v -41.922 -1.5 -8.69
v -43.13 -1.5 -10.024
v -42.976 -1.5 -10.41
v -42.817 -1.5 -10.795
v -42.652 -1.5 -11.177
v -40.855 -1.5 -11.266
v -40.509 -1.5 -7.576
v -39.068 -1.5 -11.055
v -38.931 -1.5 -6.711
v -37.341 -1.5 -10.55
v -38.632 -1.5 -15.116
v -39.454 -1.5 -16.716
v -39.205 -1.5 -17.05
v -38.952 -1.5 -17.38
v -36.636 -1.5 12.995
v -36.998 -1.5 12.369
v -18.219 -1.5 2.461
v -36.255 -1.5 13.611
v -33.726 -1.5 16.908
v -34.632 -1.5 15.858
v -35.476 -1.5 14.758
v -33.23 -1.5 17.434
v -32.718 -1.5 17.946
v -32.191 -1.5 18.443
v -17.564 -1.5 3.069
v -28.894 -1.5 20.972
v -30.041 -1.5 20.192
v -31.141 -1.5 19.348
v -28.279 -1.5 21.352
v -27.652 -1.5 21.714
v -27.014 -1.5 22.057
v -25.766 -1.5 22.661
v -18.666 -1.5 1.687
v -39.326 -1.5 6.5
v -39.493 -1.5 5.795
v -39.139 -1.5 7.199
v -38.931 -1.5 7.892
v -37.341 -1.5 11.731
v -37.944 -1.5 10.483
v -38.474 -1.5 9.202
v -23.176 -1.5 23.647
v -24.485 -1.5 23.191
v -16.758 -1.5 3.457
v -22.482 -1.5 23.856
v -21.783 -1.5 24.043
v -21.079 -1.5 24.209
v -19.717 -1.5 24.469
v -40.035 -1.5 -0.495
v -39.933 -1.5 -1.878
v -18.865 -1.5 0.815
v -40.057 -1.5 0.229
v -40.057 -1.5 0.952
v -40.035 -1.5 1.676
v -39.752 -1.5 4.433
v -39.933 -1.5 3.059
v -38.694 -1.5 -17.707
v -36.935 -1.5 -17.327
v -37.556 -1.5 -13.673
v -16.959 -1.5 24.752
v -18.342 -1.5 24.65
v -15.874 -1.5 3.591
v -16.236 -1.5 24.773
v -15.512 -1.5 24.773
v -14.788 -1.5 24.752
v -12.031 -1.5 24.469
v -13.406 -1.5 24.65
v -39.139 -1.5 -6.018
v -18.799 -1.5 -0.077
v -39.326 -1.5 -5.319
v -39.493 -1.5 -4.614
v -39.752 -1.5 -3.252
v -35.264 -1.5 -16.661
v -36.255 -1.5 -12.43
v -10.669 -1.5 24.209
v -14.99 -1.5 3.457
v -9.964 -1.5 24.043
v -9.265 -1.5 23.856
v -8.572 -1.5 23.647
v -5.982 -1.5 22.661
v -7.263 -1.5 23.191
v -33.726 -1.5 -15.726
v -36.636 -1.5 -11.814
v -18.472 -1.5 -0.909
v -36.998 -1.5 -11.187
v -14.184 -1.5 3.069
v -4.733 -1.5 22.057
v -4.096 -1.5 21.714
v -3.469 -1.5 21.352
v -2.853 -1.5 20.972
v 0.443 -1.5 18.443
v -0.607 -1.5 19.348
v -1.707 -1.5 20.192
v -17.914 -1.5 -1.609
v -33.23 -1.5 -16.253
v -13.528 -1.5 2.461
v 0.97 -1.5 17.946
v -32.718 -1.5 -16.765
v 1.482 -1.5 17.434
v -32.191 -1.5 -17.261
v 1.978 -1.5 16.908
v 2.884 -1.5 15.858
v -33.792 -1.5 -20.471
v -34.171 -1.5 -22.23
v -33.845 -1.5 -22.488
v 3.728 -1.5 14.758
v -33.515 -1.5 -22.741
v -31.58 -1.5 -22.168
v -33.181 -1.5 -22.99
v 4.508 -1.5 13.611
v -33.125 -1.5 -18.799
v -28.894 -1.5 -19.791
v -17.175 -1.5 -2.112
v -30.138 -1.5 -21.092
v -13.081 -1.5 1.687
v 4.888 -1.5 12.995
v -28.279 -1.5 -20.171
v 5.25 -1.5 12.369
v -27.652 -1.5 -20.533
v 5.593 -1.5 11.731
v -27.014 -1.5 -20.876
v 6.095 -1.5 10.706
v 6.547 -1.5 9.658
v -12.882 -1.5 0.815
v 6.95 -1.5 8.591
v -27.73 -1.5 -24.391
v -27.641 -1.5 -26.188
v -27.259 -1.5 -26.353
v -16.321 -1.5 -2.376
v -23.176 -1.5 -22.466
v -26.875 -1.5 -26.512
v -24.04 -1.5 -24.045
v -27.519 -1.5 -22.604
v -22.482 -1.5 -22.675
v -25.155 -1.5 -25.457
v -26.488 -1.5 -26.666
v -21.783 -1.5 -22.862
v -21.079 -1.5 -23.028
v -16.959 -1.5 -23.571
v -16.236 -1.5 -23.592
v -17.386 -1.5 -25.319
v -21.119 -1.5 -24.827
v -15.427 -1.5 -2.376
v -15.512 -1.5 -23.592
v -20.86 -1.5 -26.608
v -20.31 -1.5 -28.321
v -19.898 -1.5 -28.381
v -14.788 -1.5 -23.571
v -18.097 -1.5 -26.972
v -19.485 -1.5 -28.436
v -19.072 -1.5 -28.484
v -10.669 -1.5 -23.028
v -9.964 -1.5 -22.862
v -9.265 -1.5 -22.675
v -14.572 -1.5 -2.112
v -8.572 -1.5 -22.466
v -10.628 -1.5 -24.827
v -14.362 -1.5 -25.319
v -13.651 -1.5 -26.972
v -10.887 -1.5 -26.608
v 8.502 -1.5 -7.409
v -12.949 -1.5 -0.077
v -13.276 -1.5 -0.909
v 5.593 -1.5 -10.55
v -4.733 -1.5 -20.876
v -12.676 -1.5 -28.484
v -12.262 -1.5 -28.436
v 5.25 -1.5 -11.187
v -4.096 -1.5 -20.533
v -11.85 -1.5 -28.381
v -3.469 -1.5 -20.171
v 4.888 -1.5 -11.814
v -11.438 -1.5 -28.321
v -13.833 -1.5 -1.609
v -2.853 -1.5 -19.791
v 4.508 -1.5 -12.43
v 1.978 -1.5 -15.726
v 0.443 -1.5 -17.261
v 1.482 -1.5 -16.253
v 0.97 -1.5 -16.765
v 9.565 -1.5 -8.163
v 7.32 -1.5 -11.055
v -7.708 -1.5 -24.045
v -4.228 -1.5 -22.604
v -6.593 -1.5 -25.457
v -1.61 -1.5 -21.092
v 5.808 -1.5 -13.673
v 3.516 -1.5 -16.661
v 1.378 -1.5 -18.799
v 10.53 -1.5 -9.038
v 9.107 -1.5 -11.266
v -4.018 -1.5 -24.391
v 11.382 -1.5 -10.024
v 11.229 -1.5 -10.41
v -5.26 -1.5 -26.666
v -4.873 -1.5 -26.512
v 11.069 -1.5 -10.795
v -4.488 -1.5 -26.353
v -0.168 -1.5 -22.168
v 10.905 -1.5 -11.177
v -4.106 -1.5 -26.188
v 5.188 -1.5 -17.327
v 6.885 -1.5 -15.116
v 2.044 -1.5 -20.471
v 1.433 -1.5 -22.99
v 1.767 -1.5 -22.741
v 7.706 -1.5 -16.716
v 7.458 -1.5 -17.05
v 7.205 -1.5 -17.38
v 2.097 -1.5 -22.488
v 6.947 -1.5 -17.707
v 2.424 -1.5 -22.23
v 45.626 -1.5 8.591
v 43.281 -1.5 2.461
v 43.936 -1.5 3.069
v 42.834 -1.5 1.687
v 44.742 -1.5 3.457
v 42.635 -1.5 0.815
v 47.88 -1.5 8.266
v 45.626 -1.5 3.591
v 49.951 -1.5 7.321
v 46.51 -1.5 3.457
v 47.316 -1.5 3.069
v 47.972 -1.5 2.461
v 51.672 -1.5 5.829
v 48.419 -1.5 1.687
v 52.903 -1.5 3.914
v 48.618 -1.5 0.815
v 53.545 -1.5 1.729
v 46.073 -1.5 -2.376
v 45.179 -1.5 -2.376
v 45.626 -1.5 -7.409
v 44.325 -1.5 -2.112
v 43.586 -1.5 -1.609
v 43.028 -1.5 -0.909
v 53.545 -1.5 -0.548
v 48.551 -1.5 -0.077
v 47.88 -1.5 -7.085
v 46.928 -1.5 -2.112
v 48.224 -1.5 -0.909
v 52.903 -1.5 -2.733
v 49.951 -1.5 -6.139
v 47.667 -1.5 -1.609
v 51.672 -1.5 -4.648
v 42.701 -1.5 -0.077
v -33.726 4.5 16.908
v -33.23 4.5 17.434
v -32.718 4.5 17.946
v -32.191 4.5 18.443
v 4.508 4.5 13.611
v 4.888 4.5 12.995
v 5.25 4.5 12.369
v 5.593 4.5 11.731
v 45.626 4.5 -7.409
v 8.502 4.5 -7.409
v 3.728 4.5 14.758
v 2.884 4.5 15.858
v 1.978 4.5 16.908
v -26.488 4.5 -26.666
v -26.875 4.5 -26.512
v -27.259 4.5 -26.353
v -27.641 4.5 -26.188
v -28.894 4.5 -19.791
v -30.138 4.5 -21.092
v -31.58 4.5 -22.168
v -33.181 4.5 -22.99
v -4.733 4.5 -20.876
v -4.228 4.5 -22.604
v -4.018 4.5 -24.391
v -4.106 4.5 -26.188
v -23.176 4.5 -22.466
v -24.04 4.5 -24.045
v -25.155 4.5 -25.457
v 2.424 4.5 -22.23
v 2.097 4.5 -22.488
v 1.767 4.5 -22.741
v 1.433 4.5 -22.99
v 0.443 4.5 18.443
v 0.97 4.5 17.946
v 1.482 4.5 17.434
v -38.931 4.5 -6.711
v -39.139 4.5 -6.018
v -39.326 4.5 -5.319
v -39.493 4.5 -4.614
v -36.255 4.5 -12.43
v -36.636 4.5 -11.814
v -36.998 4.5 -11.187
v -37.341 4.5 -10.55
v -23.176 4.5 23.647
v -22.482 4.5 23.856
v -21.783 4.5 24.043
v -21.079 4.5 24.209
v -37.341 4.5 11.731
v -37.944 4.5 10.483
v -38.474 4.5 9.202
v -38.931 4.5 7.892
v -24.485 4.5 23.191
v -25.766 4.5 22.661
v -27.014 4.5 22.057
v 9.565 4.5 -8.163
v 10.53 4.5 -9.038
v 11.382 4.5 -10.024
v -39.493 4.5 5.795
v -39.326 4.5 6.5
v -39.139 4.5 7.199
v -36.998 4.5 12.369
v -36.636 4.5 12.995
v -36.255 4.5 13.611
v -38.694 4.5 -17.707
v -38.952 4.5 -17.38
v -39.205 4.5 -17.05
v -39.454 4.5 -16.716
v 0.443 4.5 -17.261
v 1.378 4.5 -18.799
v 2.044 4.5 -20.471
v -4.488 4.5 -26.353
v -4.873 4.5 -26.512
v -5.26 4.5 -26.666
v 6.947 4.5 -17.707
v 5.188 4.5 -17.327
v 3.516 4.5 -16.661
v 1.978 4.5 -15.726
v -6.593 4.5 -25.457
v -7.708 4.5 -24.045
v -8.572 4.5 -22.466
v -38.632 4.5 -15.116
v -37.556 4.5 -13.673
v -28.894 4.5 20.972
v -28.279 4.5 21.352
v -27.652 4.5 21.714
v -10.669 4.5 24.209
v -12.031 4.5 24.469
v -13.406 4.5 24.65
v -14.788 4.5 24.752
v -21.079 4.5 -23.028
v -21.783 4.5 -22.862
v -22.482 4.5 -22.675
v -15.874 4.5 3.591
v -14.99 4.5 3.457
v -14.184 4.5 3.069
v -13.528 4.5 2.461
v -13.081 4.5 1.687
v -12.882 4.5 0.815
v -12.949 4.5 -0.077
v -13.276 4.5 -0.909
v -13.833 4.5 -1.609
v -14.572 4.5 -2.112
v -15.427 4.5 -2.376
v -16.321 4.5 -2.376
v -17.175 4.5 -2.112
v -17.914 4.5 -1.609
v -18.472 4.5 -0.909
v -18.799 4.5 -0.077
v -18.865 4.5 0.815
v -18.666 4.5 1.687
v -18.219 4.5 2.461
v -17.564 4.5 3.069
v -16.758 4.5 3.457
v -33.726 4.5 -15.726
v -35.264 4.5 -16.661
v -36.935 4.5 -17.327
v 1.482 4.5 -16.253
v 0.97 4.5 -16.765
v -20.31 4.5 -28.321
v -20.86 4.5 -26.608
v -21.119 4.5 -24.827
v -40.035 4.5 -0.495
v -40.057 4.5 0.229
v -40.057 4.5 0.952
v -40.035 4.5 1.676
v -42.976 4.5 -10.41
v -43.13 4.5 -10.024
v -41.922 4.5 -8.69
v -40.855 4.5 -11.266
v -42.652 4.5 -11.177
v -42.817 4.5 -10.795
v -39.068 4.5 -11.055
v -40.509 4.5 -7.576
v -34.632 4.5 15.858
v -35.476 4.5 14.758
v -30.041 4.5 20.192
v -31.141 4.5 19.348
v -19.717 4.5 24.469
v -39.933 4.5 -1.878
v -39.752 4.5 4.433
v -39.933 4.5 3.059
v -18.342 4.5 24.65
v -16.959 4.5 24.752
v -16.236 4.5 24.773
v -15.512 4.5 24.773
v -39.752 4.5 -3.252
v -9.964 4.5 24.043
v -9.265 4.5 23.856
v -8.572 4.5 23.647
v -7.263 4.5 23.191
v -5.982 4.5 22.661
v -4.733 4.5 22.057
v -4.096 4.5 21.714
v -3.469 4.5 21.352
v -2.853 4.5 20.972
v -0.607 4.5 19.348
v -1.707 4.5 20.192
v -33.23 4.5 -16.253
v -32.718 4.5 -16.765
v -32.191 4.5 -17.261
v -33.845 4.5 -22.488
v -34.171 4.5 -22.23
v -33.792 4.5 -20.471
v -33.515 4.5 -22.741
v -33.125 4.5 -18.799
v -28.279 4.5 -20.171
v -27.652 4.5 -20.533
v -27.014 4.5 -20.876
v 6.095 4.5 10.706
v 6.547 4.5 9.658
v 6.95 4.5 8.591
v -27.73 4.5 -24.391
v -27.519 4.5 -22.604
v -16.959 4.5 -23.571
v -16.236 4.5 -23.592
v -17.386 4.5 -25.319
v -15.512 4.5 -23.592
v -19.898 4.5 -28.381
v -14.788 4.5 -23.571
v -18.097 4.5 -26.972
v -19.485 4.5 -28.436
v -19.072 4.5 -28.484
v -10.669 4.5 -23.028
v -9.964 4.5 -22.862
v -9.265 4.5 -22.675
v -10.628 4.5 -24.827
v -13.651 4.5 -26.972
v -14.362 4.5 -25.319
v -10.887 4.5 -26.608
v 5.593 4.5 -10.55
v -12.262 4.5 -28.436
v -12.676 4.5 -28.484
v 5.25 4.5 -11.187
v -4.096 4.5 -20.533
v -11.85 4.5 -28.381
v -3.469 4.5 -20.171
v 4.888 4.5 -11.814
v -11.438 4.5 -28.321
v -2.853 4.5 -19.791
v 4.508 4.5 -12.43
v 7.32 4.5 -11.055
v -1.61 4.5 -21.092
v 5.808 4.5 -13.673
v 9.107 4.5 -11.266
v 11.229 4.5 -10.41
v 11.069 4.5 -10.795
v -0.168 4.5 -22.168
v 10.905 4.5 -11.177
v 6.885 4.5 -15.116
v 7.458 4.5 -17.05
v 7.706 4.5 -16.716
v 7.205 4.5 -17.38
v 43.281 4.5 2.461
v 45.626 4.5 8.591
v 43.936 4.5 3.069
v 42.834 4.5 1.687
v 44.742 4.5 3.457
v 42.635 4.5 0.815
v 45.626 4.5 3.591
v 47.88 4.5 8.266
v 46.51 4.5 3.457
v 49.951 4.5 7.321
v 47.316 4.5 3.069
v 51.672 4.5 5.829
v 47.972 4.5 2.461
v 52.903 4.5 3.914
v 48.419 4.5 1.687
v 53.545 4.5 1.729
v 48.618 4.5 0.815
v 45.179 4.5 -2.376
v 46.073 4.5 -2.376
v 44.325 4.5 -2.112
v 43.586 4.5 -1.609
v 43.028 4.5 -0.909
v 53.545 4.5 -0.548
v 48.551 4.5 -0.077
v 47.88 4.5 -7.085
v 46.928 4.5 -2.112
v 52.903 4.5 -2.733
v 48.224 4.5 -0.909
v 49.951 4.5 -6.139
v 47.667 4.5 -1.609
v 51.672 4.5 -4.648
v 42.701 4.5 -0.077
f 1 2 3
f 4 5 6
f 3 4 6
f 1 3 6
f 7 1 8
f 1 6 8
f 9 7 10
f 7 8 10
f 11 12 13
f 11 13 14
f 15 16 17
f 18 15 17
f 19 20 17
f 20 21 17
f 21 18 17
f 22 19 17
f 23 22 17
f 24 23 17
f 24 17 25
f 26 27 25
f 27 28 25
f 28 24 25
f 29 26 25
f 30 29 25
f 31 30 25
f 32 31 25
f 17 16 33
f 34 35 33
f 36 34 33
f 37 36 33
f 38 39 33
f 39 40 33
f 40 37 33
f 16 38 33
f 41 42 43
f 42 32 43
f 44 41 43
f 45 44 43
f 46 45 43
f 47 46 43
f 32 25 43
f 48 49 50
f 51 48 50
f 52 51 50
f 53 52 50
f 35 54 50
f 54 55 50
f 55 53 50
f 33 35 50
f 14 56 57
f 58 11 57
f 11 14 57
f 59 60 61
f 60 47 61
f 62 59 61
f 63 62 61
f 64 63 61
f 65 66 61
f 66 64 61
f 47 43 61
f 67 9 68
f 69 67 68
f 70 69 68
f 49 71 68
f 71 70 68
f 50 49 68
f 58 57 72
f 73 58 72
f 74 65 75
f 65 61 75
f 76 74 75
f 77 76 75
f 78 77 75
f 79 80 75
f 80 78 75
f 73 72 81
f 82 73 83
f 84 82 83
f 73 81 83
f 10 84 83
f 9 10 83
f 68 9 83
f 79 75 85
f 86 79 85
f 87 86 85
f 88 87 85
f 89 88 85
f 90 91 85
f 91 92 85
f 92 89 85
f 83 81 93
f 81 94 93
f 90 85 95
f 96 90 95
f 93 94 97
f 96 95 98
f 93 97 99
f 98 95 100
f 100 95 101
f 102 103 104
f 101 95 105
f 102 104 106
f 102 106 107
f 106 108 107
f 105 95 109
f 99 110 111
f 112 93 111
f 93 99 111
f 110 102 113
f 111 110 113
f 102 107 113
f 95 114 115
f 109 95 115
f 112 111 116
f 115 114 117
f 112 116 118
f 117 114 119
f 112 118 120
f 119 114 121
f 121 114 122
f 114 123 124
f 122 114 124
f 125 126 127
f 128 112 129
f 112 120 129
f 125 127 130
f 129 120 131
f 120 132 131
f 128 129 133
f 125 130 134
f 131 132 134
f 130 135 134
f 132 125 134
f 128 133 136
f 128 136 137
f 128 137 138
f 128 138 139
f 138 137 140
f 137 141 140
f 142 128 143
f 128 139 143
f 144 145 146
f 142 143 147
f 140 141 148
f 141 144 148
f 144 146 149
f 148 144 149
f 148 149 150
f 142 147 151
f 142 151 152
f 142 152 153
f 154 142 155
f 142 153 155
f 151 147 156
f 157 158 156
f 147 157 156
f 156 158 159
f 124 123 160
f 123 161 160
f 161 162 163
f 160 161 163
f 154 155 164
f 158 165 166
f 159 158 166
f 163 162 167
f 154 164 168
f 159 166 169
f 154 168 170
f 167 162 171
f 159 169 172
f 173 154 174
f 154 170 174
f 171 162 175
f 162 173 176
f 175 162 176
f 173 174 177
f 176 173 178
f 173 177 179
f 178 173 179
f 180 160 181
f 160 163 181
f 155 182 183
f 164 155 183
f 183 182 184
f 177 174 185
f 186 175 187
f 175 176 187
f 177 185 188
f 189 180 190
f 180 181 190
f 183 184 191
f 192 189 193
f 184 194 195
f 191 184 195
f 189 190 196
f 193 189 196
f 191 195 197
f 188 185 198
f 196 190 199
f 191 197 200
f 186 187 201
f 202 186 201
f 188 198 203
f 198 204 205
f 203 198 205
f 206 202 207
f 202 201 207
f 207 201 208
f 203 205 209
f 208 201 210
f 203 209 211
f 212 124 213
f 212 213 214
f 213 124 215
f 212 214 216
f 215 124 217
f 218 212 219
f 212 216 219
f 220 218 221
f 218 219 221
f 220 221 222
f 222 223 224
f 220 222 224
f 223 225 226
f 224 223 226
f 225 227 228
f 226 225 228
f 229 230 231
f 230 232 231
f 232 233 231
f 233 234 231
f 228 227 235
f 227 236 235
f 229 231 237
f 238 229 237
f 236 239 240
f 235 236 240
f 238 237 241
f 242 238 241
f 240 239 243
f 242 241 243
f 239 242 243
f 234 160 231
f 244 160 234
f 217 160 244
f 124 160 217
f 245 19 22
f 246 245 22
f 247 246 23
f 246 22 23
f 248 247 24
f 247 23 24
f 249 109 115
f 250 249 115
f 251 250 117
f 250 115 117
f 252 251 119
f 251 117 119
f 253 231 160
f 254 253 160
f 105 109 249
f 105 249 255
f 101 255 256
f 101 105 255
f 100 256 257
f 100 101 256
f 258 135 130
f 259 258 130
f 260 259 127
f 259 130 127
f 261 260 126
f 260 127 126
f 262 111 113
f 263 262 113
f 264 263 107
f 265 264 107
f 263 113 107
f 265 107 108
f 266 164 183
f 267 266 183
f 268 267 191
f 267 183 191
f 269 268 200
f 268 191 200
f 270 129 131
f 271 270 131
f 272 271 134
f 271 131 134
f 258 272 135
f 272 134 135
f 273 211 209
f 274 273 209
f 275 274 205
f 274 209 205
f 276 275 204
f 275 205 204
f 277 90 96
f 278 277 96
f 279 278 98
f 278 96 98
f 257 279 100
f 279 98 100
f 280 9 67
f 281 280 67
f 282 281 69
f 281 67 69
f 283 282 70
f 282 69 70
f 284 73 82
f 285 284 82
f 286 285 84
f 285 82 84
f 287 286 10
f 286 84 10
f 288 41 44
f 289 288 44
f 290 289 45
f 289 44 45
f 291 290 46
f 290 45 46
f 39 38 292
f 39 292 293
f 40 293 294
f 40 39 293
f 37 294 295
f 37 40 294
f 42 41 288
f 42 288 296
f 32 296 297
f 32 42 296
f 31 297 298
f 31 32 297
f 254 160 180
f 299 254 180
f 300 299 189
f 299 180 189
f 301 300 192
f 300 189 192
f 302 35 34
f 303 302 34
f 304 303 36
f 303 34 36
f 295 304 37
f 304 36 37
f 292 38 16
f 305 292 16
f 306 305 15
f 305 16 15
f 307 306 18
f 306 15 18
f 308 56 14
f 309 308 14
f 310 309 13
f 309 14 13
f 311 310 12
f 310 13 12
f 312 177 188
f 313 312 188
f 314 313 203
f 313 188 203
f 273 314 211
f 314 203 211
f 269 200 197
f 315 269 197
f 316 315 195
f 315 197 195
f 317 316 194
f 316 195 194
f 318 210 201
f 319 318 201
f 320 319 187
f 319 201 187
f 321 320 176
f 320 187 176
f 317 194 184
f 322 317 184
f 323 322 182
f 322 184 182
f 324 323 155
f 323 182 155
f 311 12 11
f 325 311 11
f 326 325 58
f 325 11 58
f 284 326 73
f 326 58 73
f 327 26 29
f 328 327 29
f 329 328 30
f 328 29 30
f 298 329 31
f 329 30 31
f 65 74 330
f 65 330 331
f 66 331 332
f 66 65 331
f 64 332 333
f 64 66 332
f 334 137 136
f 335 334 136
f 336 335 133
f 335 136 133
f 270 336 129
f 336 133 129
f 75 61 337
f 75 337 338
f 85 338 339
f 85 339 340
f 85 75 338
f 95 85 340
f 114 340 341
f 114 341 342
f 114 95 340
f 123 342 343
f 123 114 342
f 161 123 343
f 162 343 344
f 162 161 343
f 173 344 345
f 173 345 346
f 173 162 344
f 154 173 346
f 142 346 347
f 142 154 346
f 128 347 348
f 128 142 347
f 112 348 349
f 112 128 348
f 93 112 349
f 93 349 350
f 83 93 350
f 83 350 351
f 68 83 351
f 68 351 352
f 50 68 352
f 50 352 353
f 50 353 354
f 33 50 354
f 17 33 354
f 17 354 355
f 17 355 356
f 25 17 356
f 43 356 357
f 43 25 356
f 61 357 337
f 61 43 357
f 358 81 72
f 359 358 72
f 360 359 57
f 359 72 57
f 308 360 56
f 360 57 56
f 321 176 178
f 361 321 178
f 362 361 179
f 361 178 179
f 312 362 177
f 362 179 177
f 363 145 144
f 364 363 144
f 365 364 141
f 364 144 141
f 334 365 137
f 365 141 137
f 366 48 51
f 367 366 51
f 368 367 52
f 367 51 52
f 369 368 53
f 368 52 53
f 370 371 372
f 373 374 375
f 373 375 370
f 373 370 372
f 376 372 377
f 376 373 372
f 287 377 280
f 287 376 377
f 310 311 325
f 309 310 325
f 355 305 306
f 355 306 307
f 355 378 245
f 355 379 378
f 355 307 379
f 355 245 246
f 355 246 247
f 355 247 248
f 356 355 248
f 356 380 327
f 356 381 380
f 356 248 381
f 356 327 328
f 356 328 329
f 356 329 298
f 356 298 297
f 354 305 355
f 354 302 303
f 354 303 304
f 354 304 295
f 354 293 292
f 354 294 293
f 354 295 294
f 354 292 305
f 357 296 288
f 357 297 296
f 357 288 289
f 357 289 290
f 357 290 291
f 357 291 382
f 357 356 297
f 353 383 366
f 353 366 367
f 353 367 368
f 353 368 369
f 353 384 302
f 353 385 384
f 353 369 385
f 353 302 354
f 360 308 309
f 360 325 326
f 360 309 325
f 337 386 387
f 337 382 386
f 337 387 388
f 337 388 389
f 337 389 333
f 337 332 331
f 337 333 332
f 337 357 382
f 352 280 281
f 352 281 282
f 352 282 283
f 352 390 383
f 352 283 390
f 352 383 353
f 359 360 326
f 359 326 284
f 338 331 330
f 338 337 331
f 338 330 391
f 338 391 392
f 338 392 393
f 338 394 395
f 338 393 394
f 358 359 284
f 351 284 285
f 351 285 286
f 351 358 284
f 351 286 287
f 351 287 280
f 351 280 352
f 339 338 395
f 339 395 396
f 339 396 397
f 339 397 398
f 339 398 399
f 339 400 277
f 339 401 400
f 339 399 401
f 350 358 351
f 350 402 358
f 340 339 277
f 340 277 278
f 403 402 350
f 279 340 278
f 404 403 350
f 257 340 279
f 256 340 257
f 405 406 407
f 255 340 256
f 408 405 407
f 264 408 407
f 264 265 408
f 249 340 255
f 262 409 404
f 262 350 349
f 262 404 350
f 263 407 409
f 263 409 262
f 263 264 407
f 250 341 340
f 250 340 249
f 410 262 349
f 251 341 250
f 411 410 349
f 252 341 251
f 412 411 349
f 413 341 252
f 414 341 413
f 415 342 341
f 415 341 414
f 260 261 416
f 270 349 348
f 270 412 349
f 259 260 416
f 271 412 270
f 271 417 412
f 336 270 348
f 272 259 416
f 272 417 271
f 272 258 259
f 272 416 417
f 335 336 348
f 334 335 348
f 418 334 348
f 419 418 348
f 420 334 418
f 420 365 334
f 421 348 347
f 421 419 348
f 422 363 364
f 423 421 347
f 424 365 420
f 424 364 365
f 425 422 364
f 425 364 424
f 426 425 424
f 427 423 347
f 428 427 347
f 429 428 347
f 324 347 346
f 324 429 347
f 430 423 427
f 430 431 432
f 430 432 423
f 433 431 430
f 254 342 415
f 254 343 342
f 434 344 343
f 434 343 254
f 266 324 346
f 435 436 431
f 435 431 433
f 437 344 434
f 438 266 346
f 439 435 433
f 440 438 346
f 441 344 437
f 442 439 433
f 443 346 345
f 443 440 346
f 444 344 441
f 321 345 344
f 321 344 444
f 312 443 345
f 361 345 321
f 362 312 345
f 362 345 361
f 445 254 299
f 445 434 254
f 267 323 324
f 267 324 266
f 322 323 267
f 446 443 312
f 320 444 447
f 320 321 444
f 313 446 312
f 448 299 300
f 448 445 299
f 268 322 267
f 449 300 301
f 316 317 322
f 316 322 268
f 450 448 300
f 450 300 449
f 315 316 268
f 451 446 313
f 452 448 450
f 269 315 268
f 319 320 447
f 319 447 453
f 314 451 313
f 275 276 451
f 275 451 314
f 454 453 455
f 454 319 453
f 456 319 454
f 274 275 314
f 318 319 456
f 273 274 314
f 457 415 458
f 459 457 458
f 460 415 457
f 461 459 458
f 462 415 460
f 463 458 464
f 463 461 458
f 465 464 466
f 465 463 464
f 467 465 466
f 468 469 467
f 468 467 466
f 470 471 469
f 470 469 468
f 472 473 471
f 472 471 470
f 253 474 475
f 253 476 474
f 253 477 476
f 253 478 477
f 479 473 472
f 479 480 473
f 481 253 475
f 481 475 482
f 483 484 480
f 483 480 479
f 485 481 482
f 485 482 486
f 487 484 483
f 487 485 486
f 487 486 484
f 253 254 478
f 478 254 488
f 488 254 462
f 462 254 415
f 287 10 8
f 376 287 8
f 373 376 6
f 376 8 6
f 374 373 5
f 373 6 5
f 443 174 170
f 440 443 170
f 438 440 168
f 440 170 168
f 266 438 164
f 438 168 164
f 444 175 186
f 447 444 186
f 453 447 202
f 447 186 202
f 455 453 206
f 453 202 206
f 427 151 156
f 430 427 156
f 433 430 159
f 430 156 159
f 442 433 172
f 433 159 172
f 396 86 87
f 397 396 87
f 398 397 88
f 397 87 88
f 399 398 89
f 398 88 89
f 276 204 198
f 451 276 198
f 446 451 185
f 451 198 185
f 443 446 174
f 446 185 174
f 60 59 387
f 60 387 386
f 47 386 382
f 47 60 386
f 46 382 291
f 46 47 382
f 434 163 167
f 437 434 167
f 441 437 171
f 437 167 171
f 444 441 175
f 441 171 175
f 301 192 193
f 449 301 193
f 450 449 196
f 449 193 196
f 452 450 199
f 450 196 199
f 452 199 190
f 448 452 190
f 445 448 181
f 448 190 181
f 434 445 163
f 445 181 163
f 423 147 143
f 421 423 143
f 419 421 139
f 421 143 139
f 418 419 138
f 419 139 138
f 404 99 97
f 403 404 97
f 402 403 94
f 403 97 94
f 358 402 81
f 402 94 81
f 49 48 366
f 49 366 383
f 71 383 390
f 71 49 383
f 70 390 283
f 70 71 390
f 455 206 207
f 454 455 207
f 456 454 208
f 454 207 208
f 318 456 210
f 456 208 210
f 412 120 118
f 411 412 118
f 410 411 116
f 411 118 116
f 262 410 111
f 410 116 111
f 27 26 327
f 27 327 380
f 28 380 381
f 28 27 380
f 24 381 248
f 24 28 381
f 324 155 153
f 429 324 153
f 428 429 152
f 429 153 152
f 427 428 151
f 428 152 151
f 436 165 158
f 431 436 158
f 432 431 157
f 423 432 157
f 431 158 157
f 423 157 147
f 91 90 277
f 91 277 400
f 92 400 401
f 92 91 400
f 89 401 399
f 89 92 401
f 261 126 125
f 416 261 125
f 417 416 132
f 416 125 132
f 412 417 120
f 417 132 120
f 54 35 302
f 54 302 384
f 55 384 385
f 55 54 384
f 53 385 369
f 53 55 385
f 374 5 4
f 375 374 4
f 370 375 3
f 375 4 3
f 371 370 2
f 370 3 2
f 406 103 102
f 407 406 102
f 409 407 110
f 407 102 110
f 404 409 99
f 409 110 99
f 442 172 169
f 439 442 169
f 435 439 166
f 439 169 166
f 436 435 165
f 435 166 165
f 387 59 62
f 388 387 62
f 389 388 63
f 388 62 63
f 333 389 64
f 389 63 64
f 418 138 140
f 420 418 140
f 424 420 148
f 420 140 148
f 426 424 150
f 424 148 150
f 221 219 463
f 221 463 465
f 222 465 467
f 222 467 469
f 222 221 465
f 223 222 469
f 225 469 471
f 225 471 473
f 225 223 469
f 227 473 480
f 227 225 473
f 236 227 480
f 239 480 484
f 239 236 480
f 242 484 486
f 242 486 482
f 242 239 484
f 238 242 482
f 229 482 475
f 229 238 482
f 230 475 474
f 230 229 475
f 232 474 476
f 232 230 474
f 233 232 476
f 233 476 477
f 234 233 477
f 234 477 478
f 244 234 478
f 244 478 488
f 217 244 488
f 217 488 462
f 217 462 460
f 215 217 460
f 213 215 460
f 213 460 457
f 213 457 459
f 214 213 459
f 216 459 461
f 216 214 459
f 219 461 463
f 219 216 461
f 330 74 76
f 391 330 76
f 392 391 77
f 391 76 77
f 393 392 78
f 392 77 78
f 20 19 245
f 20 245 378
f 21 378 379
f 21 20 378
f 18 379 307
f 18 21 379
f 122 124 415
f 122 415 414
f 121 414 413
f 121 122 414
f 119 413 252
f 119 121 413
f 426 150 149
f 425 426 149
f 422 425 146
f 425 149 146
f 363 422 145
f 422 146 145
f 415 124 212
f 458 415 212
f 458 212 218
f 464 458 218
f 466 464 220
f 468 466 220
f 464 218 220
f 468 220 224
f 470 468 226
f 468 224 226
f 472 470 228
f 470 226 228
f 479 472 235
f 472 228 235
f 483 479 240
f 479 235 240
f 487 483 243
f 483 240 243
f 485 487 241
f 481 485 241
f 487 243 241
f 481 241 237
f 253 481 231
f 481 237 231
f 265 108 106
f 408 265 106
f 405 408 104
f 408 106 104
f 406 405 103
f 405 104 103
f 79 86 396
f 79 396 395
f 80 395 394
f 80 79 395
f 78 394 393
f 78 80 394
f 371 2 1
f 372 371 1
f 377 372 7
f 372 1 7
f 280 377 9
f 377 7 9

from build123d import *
from build123d.topology import SkipClean

# Parameters (mm, degrees)
SKETCH1_R           = 1.5
BOSS_EXTRUDE1_DEPTH = 3
CUT_EXTRUDE1_START  = -10
CUT_EXTRUDE1_DEPTH  = 10
SCALE1_SCALE        = 2


with BuildPart() as part:
    # Sketch1 → Boss-Extrude1 (new body)
    with BuildSketch(Plane(origin=(0, 0, 0), x_dir=(1, 0, 0), z_dir=(0, 1, 0))):
        with BuildLine():
            Line((20.643657446, 4), (2.081641936, 4))
            ThreePointArc((2.081641936, 4), (2.861028333, 4.588201733), (3.521749436, 5.30713988))
            ThreePointArc((3.521749436, 5.30713988), (3.405395609, 5.596745198), (3.282888305, 5.883801663))
            ThreePointArc((3.282888305, 5.883801663), (1.93527598, 5.894040025), (0.627094961, 5.57027124))
            ThreePointArc((0.627094961, 5.57027124), (0.366286148, 6.046375), (0.084372603, 6.510293938))
            ThreePointArc((0.084372603, 6.510293938), (1.018855105, 7.48132754), (1.683794586, 8.65351323))
            ThreePointArc((1.683794586, 8.65351323), (1.496450048, 8.903135899), (1.303821399, 9.148703928))
            ThreePointArc((1.303821399, 9.148703928), (-0.000522033, 8.809805691), (-1.180330337, 8.158486898))
            ThreePointArc((-1.180330337, 8.158486898), (-1.555477026, 8.550865528), (-1.947855656, 8.926012217))
            ThreePointArc((-1.947855656, 8.926012217), (-1.296536862, 10.105820521), (-0.957638625, 11.410163953))
            ThreePointArc((-0.957638625, 11.410163953), (-1.203206655, 11.602792602), (-1.452829324, 11.79013714))
            ThreePointArc((-1.452829324, 11.79013714), (-2.625015014, 11.125197659), (-3.596048616, 10.190715157))
            ThreePointArc((-3.596048616, 10.190715157), (-4.059967554, 10.472628702), (-4.536071314, 10.733437515))
            ThreePointArc((-4.536071314, 10.733437515), (-4.212302529, 12.041618533), (-4.222540891, 13.389230859))
            ThreePointArc((-4.222540891, 13.389230859), (-4.509597355, 13.511738163), (-4.799202674, 13.62809199))
            ThreePointArc((-4.799202674, 13.62809199), (-5.759348103, 12.682425791), (-6.455432668, 11.528463019))
            ThreePointArc((-6.455432668, 11.528463019), (-6.976508546, 11.680699536), (-7.503891752, 11.809396783))
            ThreePointArc((-7.503891752, 11.809396783), (-7.529737283, 13.156800143), (-7.888414517, 14.455843809))
            ThreePointArc((-7.888414517, 14.455843809), (-8.197396993, 14.499881098), (-8.507248835, 14.537314892))
            ThreePointArc((-8.507248835, 14.537314892), (-9.18992168, 13.375367565), (-9.563620196, 12.080565177))
            ThreePointArc((-9.563620196, 12.080565177), (-10.106342554, 12.09275), (-10.649064912, 12.080565177))
            ThreePointArc((-10.649064912, 12.080565177), (-11.022763428, 13.375367565), (-11.705436272, 14.537314892))
            ThreePointArc((-11.705436272, 14.537314892), (-12.015288115, 14.499881098), (-12.324270591, 14.455843809))
            ThreePointArc((-12.324270591, 14.455843809), (-12.682947825, 13.156800143), (-12.708793355, 11.809396783))
            ThreePointArc((-12.708793355, 11.809396783), (-13.236176561, 11.680699536), (-13.757252439, 11.528463019))
            ThreePointArc((-13.757252439, 11.528463019), (-14.453337005, 12.682425791), (-15.413482434, 13.62809199))
            ThreePointArc((-15.413482434, 13.62809199), (-15.703087752, 13.511738163), (-15.990144217, 13.389230859))
            ThreePointArc((-15.990144217, 13.389230859), (-16.000382579, 12.041618533), (-15.676613793, 10.733437515))
            ThreePointArc((-15.676613793, 10.733437515), (-16.152717554, 10.472628702), (-16.616636492, 10.190715157))
            ThreePointArc((-16.616636492, 10.190715157), (-17.587670094, 11.125197659), (-18.759855783, 11.79013714))
            ThreePointArc((-18.759855783, 11.79013714), (-19.009478453, 11.602792602), (-19.255046482, 11.410163953))
            ThreePointArc((-19.255046482, 11.410163953), (-18.916148245, 10.105820521), (-18.264829452, 8.926012217))
            ThreePointArc((-18.264829452, 8.926012217), (-18.657208082, 8.550865528), (-19.032354771, 8.158486898))
            ThreePointArc((-19.032354771, 8.158486898), (-20.212163074, 8.809805691), (-21.516506507, 9.148703928))
            ThreePointArc((-21.516506507, 9.148703928), (-21.709135156, 8.903135899), (-21.896479694, 8.65351323))
            ThreePointArc((-21.896479694, 8.65351323), (-21.231540213, 7.48132754), (-20.297057711, 6.510293938))
            ThreePointArc((-20.297057711, 6.510293938), (-20.578971255, 6.046375), (-20.839780068, 5.57027124))
            ThreePointArc((-20.839780068, 5.57027124), (-22.147961087, 5.894040025), (-23.495573413, 5.883801663))
            ThreePointArc((-23.495573413, 5.883801663), (-23.618080717, 5.596745198), (-23.734434544, 5.30713988))
            ThreePointArc((-23.734434544, 5.30713988), (-22.788768345, 4.346994451), (-21.634805572, 3.650909885))
            ThreePointArc((-21.634805572, 3.650909885), (-21.78704209, 3.129834008), (-21.915739337, 2.602450802))
            ThreePointArc((-21.915739337, 2.602450802), (-23.263142697, 2.576605271), (-24.562186363, 2.217928037))
            ThreePointArc((-24.562186363, 2.217928037), (-24.606223651, 1.908945561), (-24.643657446, 1.599093719))
            ThreePointArc((-24.643657446, 1.599093719), (-23.481710119, 0.916420874), (-22.186907731, 0.542722358))
            ThreePointArc((-22.186907731, 0.542722358), (-22.199092554, 0), (-22.186907731, -0.542722358))
            ThreePointArc((-22.186907731, -0.542722358), (-23.481710119, -0.916420874), (-24.643657446, -1.599093719))
            ThreePointArc((-24.643657446, -1.599093719), (-24.606223651, -1.908945561), (-24.562186363, -2.217928037))
            ThreePointArc((-24.562186363, -2.217928037), (-23.263142697, -2.576605271), (-21.915739337, -2.602450802))
            ThreePointArc((-21.915739337, -2.602450802), (-21.78704209, -3.129834008), (-21.634805572, -3.650909885))
            ThreePointArc((-21.634805572, -3.650909885), (-22.788768345, -4.346994451), (-23.734434544, -5.30713988))
            ThreePointArc((-23.734434544, -5.30713988), (-23.618080717, -5.596745198), (-23.495573413, -5.883801663))
            ThreePointArc((-23.495573413, -5.883801663), (-22.147961087, -5.894040025), (-20.839780068, -5.57027124))
            ThreePointArc((-20.839780068, -5.57027124), (-20.578971255, -6.046375), (-20.297057711, -6.510293938))
            ThreePointArc((-20.297057711, -6.510293938), (-21.231540213, -7.48132754), (-21.896479694, -8.65351323))
            ThreePointArc((-21.896479694, -8.65351323), (-21.709135156, -8.903135899), (-21.516506507, -9.148703928))
            ThreePointArc((-21.516506507, -9.148703928), (-20.212163074, -8.809805691), (-19.032354771, -8.158486898))
            ThreePointArc((-19.032354771, -8.158486898), (-18.657208082, -8.550865528), (-18.264829452, -8.926012217))
            ThreePointArc((-18.264829452, -8.926012217), (-18.916148245, -10.105820521), (-19.255046482, -11.410163953))
            ThreePointArc((-19.255046482, -11.410163953), (-19.009478453, -11.602792602), (-18.759855783, -11.79013714))
            ThreePointArc((-18.759855783, -11.79013714), (-17.587670094, -11.125197659), (-16.616636492, -10.190715157))
            ThreePointArc((-16.616636492, -10.190715157), (-16.152717554, -10.472628702), (-15.676613793, -10.733437515))
            ThreePointArc((-15.676613793, -10.733437515), (-16.000382579, -12.041618533), (-15.990144217, -13.389230859))
            ThreePointArc((-15.990144217, -13.389230859), (-15.703087752, -13.511738163), (-15.413482434, -13.62809199))
            ThreePointArc((-15.413482434, -13.62809199), (-14.453337005, -12.682425791), (-13.757252439, -11.528463019))
            ThreePointArc((-13.757252439, -11.528463019), (-13.236176561, -11.680699536), (-12.708793355, -11.809396783))
            ThreePointArc((-12.708793355, -11.809396783), (-12.682947825, -13.156800143), (-12.324270591, -14.455843809))
            ThreePointArc((-12.324270591, -14.455843809), (-12.015288115, -14.499881098), (-11.705436272, -14.537314892))
            ThreePointArc((-11.705436272, -14.537314892), (-11.022763428, -13.375367565), (-10.649064912, -12.080565177))
            ThreePointArc((-10.649064912, -12.080565177), (-10.106342554, -12.09275), (-9.563620196, -12.080565177))
            ThreePointArc((-9.563620196, -12.080565177), (-9.18992168, -13.375367565), (-8.507248835, -14.537314892))
            ThreePointArc((-8.507248835, -14.537314892), (-8.197396993, -14.499881098), (-7.888414517, -14.455843809))
            ThreePointArc((-7.888414517, -14.455843809), (-7.529737283, -13.156800143), (-7.503891752, -11.809396783))
            ThreePointArc((-7.503891752, -11.809396783), (-6.976508546, -11.680699536), (-6.455432668, -11.528463019))
            ThreePointArc((-6.455432668, -11.528463019), (-5.759348103, -12.682425791), (-4.799202674, -13.62809199))
            ThreePointArc((-4.799202674, -13.62809199), (-4.509597355, -13.511738163), (-4.222540891, -13.389230859))
            ThreePointArc((-4.222540891, -13.389230859), (-4.212302529, -12.041618533), (-4.536071314, -10.733437515))
            ThreePointArc((-4.536071314, -10.733437515), (-4.059967554, -10.472628702), (-3.596048616, -10.190715157))
            ThreePointArc((-3.596048616, -10.190715157), (-2.625015014, -11.125197659), (-1.452829324, -11.79013714))
            ThreePointArc((-1.452829324, -11.79013714), (-1.203206655, -11.602792602), (-0.957638625, -11.410163953))
            ThreePointArc((-0.957638625, -11.410163953), (-1.296536862, -10.105820521), (-1.947855656, -8.926012217))
            ThreePointArc((-1.947855656, -8.926012217), (-1.555477026, -8.550865528), (-1.180330337, -8.158486898))
            ThreePointArc((-1.180330337, -8.158486898), (-0.000522033, -8.809805691), (1.303821399, -9.148703928))
            ThreePointArc((1.303821399, -9.148703928), (1.496450048, -8.903135899), (1.683794586, -8.65351323))
            ThreePointArc((1.683794586, -8.65351323), (1.018855105, -7.48132754), (0.084372603, -6.510293938))
            ThreePointArc((0.084372603, -6.510293938), (0.366286148, -6.046375), (0.627094961, -5.57027124))
            ThreePointArc((0.627094961, -5.57027124), (1.93527598, -5.894040025), (3.282888305, -5.883801663))
            ThreePointArc((3.282888305, -5.883801663), (3.405395609, -5.596745198), (3.521749436, -5.30713988))
            ThreePointArc((3.521749436, -5.30713988), (2.861028333, -4.588201733), (2.081641936, -4))
            Line((2.081641936, -4), (20.643657446, -4))
            ThreePointArc((20.643657446, -4), (24.643657446, 0), (20.643657446, 4))
        make_face()
        with Locations(Location((-10.106342554, 0, 0), (0, 0, 270))):
            Circle(SKETCH1_R, mode=Mode.SUBTRACT)
        with Locations(Location((20.643657446, 0, 0), (0, 0, 270))):
            Circle(SKETCH1_R, mode=Mode.SUBTRACT)
    extrude(amount=BOSS_EXTRUDE1_DEPTH)

    # Sketch2 → Cut-Extrude1 (cut)
    with SkipClean():  # the faces are left unmerged after this step: merging them gives an invalid solid
        with BuildSketch(Plane(origin=(0, 3, 0), x_dir=(1, 0, 0), z_dir=(0, 1, 0)).offset(CUT_EXTRUDE1_START)):
            with BuildLine():
                ThreePointArc((-24.562186363, -2.217928037), (-23.263142697, -2.576605271), (-21.915739337, -2.602450802))
                ThreePointArc((-21.915739337, -2.602450802), (-22.095637401, -1.578420611), (-22.186907731, -0.542722358))
                ThreePointArc((-22.186907731, -0.542722358), (-23.481710119, -0.916420874), (-24.643657446, -1.599093719))
                ThreePointArc((-24.643657446, -1.599093719), (-24.606223651, -1.908945561), (-24.562186363, -2.217928037))
            make_face()
            with BuildLine():
                ThreePointArc((-23.495573413, -5.883801663), (-22.147961087, -5.894040025), (-20.839780068, -5.57027124))
                ThreePointArc((-20.839780068, -5.57027124), (-21.278586771, -4.627695077), (-21.634805572, -3.650909885))
                ThreePointArc((-21.634805572, -3.650909885), (-22.788768345, -4.346994451), (-23.734434544, -5.30713988))
                ThreePointArc((-23.734434544, -5.30713988), (-23.618080717, -5.596745198), (-23.495573413, -5.883801663))
            make_face()
            with BuildLine():
                ThreePointArc((-21.516506507, -9.148703928), (-20.212163074, -8.809805691), (-19.032354771, -8.158486898))
                ThreePointArc((-19.032354771, -8.158486898), (-19.70016616, -7.361599771), (-20.297057711, -6.510293938))
                ThreePointArc((-20.297057711, -6.510293938), (-21.231540213, -7.48132754), (-21.896479694, -8.65351323))
                ThreePointArc((-21.896479694, -8.65351323), (-21.709135156, -8.903135899), (-21.516506507, -9.148703928))
            make_face()
            with BuildLine():
                ThreePointArc((-18.759855783, -11.79013714), (-17.587670094, -11.125197659), (-16.616636492, -10.190715157))
                ThreePointArc((-16.616636492, -10.190715157), (-17.467942324, -9.593823606), (-18.264829452, -8.926012217))
                ThreePointArc((-18.264829452, -8.926012217), (-18.916148245, -10.105820521), (-19.255046482, -11.410163953))
                ThreePointArc((-19.255046482, -11.410163953), (-19.009478453, -11.602792602), (-18.759855783, -11.79013714))
            make_face()
            with BuildLine():
                ThreePointArc((-15.413482434, -13.62809199), (-14.453337005, -12.682425791), (-13.757252439, -11.528463019))
                ThreePointArc((-13.757252439, -11.528463019), (-14.734037631, -11.172244217), (-15.676613793, -10.733437515))
                ThreePointArc((-15.676613793, -10.733437515), (-16.000382579, -12.041618533), (-15.990144217, -13.389230859))
                ThreePointArc((-15.990144217, -13.389230859), (-15.703087752, -13.511738163), (-15.413482434, -13.62809199))
            make_face()
            with BuildLine():
                ThreePointArc((-11.705436272, -14.537314892), (-11.022763428, -13.375367565), (-10.649064912, -12.080565177))
                ThreePointArc((-10.649064912, -12.080565177), (-11.684763165, -11.989294847), (-12.708793355, -11.809396783))
                ThreePointArc((-12.708793355, -11.809396783), (-12.682947825, -13.156800143), (-12.324270591, -14.455843809))
                ThreePointArc((-12.324270591, -14.455843809), (-12.015288115, -14.499881098), (-11.705436272, -14.537314892))
            make_face()
            with BuildLine():
                ThreePointArc((-7.888414517, -14.455843809), (-7.529737283, -13.156800143), (-7.503891752, -11.809396783))
                ThreePointArc((-7.503891752, -11.809396783), (-8.527921943, -11.989294847), (-9.563620196, -12.080565177))
                ThreePointArc((-9.563620196, -12.080565177), (-9.18992168, -13.375367565), (-8.507248835, -14.537314892))
                ThreePointArc((-8.507248835, -14.537314892), (-8.197396993, -14.499881098), (-7.888414517, -14.455843809))
            make_face()
            with BuildLine():
                ThreePointArc((-4.222540891, -13.389230859), (-4.212302529, -12.041618533), (-4.536071314, -10.733437515))
                ThreePointArc((-4.536071314, -10.733437515), (-5.478647477, -11.172244217), (-6.455432668, -11.528463019))
                ThreePointArc((-6.455432668, -11.528463019), (-5.759348103, -12.682425791), (-4.799202674, -13.62809199))
                ThreePointArc((-4.799202674, -13.62809199), (-4.509597355, -13.511738163), (-4.222540891, -13.389230859))
            make_face()
            with BuildLine():
                ThreePointArc((-0.957638625, -11.410163953), (-1.296536862, -10.105820521), (-1.947855656, -8.926012217))
                ThreePointArc((-1.947855656, -8.926012217), (-2.744742783, -9.593823606), (-3.596048616, -10.190715157))
                ThreePointArc((-3.596048616, -10.190715157), (-2.625015014, -11.125197659), (-1.452829324, -11.79013714))
                ThreePointArc((-1.452829324, -11.79013714), (-1.203206655, -11.602792602), (-0.957638625, -11.410163953))
            make_face()
            with BuildLine():
                ThreePointArc((1.683794586, -8.65351323), (1.018855105, -7.48132754), (0.084372603, -6.510293938))
                ThreePointArc((0.084372603, -6.510293938), (-0.512518948, -7.361599771), (-1.180330337, -8.158486898))
                ThreePointArc((-1.180330337, -8.158486898), (-0.000522033, -8.809805691), (1.303821399, -9.148703928))
                ThreePointArc((1.303821399, -9.148703928), (1.496450048, -8.903135899), (1.683794586, -8.65351323))
            make_face()
            with BuildLine():
                ThreePointArc((3.521749436, -5.30713988), (2.861028333, -4.588201733), (2.081641936, -4))
                Line((2.081641936, -4), (1.305695063, -4))
                ThreePointArc((1.305695063, -4), (0.994195953, -4.797149927), (0.627094961, -5.57027124))
                ThreePointArc((0.627094961, -5.57027124), (1.93527598, -5.894040025), (3.282888305, -5.883801663))
                ThreePointArc((3.282888305, -5.883801663), (3.405395609, -5.596745198), (3.521749436, -5.30713988))
            make_face()
            with BuildLine():
                ThreePointArc((-22.186907731, 0.542722358), (-22.095637401, 1.578420611), (-21.915739337, 2.602450802))
                ThreePointArc((-21.915739337, 2.602450802), (-23.263142697, 2.576605271), (-24.562186363, 2.217928037))
                ThreePointArc((-24.562186363, 2.217928037), (-24.606223651, 1.908945561), (-24.643657446, 1.599093719))
                ThreePointArc((-24.643657446, 1.599093719), (-23.481710119, 0.916420874), (-22.186907731, 0.542722358))
            make_face()
        extrude(amount=CUT_EXTRUDE1_DEPTH, mode=Mode.SUBTRACT)


with BuildPart() as part_1:
    # Scale1: scaled about (-4.338876576, 1.5, -0.590548785)
    add(part.part.scale(SCALE1_SCALE).moved(Location((4.338876576, -1.5, 0.590548785))))


solid = part_1.part
